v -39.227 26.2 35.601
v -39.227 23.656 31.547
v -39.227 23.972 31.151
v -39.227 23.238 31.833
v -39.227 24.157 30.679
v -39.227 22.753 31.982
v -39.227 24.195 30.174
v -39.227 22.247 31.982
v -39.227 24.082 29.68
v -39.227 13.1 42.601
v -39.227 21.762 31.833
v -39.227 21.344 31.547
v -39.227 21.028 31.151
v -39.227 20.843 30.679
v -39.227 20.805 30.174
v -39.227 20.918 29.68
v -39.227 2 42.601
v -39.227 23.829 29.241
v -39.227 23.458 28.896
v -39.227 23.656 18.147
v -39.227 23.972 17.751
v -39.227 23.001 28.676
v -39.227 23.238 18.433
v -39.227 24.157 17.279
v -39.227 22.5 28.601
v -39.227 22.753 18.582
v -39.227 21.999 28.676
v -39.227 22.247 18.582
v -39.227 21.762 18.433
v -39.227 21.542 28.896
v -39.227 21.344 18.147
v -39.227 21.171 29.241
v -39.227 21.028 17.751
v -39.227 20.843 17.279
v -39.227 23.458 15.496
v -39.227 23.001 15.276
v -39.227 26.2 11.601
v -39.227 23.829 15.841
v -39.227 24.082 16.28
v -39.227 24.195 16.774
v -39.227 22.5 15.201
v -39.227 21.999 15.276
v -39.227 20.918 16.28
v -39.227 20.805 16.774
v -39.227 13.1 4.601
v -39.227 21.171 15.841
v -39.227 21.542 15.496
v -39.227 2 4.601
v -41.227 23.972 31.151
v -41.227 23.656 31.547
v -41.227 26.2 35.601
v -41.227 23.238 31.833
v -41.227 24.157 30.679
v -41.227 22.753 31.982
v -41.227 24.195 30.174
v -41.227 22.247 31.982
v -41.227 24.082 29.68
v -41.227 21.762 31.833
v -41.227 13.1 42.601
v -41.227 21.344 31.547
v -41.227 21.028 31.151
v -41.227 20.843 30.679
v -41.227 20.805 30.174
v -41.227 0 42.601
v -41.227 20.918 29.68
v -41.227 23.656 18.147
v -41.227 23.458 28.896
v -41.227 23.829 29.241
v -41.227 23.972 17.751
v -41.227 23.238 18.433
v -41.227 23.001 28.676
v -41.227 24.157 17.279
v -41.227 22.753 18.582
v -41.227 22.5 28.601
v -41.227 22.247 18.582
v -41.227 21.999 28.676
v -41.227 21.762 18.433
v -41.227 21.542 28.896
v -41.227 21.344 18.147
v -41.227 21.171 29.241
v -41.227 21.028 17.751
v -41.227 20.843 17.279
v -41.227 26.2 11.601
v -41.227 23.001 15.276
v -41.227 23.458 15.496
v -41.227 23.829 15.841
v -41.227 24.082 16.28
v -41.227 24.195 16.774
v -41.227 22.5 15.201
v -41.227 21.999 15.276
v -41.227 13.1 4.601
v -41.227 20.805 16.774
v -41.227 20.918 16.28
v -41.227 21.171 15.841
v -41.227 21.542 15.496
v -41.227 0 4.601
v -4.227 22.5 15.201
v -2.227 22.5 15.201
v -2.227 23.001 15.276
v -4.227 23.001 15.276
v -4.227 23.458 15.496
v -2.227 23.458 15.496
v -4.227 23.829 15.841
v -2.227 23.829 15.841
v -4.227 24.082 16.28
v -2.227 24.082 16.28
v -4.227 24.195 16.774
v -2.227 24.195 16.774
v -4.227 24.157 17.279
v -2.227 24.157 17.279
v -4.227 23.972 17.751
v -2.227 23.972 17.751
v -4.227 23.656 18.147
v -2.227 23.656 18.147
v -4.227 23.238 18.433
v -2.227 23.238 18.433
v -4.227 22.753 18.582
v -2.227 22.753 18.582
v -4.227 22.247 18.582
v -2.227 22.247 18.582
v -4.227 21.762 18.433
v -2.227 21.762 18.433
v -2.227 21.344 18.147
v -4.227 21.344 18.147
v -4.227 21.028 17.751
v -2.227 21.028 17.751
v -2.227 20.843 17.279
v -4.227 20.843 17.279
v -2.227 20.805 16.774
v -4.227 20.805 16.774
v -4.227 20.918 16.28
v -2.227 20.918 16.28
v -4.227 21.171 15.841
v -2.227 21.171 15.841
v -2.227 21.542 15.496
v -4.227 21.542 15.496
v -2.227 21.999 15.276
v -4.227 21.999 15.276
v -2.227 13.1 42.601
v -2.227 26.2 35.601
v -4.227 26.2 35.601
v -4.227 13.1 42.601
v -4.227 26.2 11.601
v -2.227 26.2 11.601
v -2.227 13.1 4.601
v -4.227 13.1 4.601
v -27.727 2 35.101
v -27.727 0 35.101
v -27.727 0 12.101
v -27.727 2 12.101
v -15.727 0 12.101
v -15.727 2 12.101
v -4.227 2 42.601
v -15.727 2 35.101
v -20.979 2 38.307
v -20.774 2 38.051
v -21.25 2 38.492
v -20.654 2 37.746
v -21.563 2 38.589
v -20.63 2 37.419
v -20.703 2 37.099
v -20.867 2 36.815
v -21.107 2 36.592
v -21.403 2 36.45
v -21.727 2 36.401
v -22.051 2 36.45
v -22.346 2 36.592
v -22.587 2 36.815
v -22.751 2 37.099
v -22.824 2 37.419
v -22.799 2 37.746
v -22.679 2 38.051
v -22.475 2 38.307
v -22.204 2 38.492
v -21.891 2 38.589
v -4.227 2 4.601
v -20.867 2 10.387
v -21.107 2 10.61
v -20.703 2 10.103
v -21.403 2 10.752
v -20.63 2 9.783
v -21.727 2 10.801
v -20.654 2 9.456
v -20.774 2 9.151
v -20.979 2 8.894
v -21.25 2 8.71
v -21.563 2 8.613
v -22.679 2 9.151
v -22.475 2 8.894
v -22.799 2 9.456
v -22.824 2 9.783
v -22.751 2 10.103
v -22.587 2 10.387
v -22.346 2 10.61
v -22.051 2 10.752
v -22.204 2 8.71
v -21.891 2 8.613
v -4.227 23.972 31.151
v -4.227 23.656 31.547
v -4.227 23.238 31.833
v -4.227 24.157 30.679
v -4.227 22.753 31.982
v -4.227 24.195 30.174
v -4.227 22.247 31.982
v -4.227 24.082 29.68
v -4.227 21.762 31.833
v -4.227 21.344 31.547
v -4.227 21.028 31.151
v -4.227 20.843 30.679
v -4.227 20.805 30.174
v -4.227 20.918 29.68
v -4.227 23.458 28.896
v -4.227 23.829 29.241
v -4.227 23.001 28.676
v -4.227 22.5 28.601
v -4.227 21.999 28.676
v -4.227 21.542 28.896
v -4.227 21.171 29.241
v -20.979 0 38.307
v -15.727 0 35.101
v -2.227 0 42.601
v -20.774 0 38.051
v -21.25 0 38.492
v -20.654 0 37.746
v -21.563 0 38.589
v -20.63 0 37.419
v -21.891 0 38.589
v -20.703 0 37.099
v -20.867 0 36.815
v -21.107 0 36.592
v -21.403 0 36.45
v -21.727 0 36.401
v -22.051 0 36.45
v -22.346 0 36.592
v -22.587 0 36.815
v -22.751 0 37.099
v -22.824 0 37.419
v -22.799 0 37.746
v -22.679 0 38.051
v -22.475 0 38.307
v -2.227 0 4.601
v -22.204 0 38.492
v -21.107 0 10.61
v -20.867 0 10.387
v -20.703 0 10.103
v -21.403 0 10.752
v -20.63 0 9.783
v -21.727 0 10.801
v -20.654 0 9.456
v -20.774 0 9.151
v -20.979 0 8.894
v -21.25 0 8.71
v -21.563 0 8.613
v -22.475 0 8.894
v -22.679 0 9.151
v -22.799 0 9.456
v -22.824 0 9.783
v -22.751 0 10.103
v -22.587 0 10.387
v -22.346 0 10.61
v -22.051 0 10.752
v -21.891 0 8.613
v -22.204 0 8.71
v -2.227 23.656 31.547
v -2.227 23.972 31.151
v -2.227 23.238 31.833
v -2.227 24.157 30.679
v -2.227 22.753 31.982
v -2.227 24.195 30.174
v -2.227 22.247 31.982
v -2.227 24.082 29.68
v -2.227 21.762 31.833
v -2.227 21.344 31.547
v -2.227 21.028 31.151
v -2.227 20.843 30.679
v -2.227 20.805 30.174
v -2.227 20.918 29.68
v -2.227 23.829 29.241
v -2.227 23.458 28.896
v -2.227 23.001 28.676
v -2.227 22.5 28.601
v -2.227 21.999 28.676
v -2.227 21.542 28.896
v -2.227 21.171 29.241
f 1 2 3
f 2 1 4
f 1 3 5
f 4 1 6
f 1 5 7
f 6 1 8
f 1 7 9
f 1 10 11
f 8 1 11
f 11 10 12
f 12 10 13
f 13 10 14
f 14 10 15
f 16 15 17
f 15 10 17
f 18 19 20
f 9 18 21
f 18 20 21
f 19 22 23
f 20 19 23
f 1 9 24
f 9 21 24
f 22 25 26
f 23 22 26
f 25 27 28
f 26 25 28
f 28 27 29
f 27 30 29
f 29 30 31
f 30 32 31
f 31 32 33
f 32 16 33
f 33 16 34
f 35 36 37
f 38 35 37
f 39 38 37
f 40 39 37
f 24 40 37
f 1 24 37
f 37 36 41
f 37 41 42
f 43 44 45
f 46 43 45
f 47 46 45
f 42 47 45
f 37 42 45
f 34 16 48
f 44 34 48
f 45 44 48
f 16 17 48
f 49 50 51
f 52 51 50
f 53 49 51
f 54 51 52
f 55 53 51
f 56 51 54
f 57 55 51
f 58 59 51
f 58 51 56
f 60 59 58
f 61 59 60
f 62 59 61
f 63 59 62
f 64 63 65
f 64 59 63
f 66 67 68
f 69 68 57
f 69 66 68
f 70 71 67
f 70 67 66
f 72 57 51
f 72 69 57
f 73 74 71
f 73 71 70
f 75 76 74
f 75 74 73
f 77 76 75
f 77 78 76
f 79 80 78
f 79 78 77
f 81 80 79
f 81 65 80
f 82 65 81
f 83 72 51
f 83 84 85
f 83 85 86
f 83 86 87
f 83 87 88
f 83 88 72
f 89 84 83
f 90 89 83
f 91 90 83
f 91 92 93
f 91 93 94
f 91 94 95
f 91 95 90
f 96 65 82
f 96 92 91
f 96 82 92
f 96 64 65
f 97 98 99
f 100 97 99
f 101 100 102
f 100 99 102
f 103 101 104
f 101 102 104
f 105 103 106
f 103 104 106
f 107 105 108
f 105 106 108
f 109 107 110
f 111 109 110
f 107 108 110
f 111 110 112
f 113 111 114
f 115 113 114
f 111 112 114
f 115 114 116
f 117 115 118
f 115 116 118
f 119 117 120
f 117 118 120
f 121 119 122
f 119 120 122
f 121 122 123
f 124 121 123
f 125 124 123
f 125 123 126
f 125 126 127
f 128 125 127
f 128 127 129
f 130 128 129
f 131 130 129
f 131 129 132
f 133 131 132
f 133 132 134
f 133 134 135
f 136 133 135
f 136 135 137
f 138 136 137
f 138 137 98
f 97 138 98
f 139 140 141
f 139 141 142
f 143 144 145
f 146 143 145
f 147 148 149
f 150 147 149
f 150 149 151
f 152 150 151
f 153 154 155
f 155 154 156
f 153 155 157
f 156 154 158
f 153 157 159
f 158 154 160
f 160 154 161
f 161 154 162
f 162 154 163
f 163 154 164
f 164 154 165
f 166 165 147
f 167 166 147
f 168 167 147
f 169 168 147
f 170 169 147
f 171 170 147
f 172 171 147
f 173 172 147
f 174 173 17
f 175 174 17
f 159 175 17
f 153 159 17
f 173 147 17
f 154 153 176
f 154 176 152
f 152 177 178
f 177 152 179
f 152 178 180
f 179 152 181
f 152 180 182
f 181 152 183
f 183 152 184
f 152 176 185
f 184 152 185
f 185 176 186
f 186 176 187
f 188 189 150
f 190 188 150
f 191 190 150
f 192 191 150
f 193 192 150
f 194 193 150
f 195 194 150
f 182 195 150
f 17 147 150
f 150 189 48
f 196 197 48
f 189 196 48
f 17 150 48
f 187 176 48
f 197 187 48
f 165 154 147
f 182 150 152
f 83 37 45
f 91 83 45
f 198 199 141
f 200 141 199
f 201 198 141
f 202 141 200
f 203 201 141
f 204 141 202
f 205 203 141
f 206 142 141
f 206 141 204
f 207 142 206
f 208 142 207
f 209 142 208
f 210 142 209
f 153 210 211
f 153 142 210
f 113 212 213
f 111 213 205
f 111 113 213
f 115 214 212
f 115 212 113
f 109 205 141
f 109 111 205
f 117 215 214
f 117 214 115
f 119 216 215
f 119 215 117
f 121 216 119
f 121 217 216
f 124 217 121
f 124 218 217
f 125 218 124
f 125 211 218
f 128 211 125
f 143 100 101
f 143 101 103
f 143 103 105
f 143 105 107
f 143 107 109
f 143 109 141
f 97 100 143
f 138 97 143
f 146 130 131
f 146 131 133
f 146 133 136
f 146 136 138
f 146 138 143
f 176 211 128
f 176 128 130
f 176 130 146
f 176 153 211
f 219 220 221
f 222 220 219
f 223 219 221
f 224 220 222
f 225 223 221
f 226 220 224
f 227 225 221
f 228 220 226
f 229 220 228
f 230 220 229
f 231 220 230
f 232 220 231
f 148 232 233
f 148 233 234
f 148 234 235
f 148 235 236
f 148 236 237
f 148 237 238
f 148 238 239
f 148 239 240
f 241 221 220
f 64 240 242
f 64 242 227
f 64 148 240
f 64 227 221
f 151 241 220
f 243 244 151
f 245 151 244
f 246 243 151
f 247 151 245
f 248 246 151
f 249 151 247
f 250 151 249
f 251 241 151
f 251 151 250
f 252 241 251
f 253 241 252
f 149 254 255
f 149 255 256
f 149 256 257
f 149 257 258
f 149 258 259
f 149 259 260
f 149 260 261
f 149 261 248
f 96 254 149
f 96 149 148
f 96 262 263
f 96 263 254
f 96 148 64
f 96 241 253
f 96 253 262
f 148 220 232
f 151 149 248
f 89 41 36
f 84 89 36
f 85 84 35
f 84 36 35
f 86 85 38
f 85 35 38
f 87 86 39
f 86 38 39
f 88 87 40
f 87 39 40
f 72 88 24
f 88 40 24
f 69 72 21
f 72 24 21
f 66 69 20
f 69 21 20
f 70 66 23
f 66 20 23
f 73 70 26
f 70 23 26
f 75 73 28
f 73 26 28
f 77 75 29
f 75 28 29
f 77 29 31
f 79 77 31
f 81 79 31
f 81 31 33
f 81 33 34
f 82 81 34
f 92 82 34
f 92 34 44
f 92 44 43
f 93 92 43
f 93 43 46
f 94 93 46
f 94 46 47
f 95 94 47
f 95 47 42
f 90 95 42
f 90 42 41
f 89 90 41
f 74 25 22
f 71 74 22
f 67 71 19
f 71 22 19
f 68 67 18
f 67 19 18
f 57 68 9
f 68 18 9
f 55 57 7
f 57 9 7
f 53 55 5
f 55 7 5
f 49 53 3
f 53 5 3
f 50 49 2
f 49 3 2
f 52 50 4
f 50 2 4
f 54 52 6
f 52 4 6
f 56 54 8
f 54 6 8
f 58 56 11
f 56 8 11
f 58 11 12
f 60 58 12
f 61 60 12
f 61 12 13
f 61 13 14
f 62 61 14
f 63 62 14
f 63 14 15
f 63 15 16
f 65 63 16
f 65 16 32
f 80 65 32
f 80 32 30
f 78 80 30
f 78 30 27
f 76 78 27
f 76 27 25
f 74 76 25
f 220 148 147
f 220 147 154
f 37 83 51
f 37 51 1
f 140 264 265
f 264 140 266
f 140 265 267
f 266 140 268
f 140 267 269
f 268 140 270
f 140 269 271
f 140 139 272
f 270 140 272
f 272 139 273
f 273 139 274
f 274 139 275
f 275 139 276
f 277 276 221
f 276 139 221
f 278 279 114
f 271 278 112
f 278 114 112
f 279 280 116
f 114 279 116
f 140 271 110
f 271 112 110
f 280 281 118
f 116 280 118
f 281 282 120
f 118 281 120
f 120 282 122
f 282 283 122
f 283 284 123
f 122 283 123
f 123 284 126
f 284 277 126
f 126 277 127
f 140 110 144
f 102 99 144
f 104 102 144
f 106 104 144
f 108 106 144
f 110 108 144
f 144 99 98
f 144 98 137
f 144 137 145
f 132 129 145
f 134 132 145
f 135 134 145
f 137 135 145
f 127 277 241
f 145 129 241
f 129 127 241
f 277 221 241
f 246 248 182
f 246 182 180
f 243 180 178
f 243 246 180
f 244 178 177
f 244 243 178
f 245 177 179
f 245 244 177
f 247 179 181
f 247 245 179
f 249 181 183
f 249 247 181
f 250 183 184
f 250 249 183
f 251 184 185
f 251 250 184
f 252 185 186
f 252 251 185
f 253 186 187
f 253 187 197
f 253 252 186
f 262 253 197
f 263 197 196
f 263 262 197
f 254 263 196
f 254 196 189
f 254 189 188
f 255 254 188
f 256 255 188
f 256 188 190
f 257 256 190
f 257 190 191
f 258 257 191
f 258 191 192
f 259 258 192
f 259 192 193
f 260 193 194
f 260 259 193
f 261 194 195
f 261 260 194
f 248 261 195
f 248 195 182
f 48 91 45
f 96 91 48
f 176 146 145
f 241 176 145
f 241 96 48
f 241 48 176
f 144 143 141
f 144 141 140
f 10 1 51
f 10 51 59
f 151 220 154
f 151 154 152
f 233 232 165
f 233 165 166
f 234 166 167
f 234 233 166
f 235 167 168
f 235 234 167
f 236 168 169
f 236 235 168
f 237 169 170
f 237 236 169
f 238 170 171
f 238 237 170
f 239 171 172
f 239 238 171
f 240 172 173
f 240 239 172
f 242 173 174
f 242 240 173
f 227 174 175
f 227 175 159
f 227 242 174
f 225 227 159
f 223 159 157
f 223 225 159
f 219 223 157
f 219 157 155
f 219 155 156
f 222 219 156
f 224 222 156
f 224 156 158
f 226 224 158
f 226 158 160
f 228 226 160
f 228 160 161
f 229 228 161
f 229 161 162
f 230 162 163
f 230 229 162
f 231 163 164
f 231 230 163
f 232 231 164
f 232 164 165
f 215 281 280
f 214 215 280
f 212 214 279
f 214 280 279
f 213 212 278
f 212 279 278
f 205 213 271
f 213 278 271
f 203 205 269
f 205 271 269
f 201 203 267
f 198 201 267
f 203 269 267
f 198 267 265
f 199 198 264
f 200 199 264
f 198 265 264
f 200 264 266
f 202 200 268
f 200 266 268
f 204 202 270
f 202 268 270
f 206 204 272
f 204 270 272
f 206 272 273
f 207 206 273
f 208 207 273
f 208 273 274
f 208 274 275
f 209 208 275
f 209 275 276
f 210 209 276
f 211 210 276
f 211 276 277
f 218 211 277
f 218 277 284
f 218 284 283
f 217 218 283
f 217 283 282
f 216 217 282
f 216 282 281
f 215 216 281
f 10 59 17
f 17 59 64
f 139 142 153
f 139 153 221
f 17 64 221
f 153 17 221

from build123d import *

# Parameters (mm, degrees)
SKETCH_2_R          = 1.1
SKETCH_2_W          = 12
SKETCH_2_H          = 23
EXTRUDE_2_DEPTH     = 2
SKETCH_4_W          = 2
SKETCH_4_H          = 38
EXTRUDE_3_DEPTH     = 24.2
SKETCH_5_W          = 2
SKETCH_5_H          = 38
EXTRUDE_4_DEPTH     = 24.2
SKETCH_6_R          = 1.7
CUT_EXTRUDE_1_DEPTH = 50
CUT_EXTRUDE_2_DEPTH = 39


with BuildPart() as part:
    # 草图2 → 凸台-拉伸2 (new body)
    with BuildSketch(Plane(origin=(0, 0, 0), x_dir=(1, 0, 0), z_dir=(0, 1, 0))):
        Polygon((-39.22677438, -4.600854345), (-4.22677438, -4.600854345), (-2.22677438, -4.600854345), (-2.22677438, -42.600854345), (-4.22677438, -42.600854345), (-39.22677438, -42.600854345), (-41.22677438, -42.600854345), (-41.22677438, -4.600854345), align=None)
        with Locations(Location((-21.72677438, -9.700854345, 0), (0, 0, 270))):
            Circle(SKETCH_2_R, mode=Mode.SUBTRACT)
        with Locations(Location((-21.72677438, -37.500854345, 0), (0, 0, 90))):
            Circle(SKETCH_2_R, mode=Mode.SUBTRACT)
        with Locations((-21.72677438, -23.600854345)):
            Rectangle(SKETCH_2_W, SKETCH_2_H, mode=Mode.SUBTRACT)
    extrude(amount=EXTRUDE_2_DEPTH)

    # 草图4 → 凸台-拉伸3 (add)
    with BuildSketch(Plane(origin=(0, 2, 0), x_dir=(1, 0, 0), z_dir=(0, 1, 0))):
        with Locations((-40.22677438, -23.600854345)):
            Rectangle(SKETCH_4_W, SKETCH_4_H)
    extrude(amount=EXTRUDE_3_DEPTH)

    # 草图5 → 凸台-拉伸4 (add)
    with BuildSketch(Plane(origin=(0, 2, 0), x_dir=(1, 0, 0), z_dir=(0, 1, 0))):
        with Locations((-3.22677438, -23.600854345)):
            Rectangle(SKETCH_5_W, SKETCH_5_H)
    extrude(amount=EXTRUDE_4_DEPTH)

    # 草图6 → 切除-拉伸1 (cut)
    with BuildSketch(Plane(origin=(-2.22677438, 0, 0), x_dir=(0, 0, -1), z_dir=(1, 0, 0))):
        with Locations((-30.300854345, 22.5)):
            Circle(SKETCH_6_R)
        with Locations((-16.900854345, 22.5)):
            Circle(SKETCH_6_R)
    extrude(amount=-CUT_EXTRUDE_1_DEPTH, mode=Mode.SUBTRACT)

    # 草图7 → 切除-拉伸2 (cut)
    with BuildSketch(Plane(origin=(-2.22677438, 0, 0), x_dir=(0, 0, -1), z_dir=(1, 0, 0))):
        Polygon((-35.600854345, 26.2), (-42.600854345, 13.1), (-42.600854345, 26.2), align=None)
        Polygon((-11.600854345, 26.2), (-4.600854345, 13.1), (-4.600854345, 26.2), align=None)
    extrude(amount=-CUT_EXTRUDE_2_DEPTH, mode=Mode.SUBTRACT)


solid = part.part
